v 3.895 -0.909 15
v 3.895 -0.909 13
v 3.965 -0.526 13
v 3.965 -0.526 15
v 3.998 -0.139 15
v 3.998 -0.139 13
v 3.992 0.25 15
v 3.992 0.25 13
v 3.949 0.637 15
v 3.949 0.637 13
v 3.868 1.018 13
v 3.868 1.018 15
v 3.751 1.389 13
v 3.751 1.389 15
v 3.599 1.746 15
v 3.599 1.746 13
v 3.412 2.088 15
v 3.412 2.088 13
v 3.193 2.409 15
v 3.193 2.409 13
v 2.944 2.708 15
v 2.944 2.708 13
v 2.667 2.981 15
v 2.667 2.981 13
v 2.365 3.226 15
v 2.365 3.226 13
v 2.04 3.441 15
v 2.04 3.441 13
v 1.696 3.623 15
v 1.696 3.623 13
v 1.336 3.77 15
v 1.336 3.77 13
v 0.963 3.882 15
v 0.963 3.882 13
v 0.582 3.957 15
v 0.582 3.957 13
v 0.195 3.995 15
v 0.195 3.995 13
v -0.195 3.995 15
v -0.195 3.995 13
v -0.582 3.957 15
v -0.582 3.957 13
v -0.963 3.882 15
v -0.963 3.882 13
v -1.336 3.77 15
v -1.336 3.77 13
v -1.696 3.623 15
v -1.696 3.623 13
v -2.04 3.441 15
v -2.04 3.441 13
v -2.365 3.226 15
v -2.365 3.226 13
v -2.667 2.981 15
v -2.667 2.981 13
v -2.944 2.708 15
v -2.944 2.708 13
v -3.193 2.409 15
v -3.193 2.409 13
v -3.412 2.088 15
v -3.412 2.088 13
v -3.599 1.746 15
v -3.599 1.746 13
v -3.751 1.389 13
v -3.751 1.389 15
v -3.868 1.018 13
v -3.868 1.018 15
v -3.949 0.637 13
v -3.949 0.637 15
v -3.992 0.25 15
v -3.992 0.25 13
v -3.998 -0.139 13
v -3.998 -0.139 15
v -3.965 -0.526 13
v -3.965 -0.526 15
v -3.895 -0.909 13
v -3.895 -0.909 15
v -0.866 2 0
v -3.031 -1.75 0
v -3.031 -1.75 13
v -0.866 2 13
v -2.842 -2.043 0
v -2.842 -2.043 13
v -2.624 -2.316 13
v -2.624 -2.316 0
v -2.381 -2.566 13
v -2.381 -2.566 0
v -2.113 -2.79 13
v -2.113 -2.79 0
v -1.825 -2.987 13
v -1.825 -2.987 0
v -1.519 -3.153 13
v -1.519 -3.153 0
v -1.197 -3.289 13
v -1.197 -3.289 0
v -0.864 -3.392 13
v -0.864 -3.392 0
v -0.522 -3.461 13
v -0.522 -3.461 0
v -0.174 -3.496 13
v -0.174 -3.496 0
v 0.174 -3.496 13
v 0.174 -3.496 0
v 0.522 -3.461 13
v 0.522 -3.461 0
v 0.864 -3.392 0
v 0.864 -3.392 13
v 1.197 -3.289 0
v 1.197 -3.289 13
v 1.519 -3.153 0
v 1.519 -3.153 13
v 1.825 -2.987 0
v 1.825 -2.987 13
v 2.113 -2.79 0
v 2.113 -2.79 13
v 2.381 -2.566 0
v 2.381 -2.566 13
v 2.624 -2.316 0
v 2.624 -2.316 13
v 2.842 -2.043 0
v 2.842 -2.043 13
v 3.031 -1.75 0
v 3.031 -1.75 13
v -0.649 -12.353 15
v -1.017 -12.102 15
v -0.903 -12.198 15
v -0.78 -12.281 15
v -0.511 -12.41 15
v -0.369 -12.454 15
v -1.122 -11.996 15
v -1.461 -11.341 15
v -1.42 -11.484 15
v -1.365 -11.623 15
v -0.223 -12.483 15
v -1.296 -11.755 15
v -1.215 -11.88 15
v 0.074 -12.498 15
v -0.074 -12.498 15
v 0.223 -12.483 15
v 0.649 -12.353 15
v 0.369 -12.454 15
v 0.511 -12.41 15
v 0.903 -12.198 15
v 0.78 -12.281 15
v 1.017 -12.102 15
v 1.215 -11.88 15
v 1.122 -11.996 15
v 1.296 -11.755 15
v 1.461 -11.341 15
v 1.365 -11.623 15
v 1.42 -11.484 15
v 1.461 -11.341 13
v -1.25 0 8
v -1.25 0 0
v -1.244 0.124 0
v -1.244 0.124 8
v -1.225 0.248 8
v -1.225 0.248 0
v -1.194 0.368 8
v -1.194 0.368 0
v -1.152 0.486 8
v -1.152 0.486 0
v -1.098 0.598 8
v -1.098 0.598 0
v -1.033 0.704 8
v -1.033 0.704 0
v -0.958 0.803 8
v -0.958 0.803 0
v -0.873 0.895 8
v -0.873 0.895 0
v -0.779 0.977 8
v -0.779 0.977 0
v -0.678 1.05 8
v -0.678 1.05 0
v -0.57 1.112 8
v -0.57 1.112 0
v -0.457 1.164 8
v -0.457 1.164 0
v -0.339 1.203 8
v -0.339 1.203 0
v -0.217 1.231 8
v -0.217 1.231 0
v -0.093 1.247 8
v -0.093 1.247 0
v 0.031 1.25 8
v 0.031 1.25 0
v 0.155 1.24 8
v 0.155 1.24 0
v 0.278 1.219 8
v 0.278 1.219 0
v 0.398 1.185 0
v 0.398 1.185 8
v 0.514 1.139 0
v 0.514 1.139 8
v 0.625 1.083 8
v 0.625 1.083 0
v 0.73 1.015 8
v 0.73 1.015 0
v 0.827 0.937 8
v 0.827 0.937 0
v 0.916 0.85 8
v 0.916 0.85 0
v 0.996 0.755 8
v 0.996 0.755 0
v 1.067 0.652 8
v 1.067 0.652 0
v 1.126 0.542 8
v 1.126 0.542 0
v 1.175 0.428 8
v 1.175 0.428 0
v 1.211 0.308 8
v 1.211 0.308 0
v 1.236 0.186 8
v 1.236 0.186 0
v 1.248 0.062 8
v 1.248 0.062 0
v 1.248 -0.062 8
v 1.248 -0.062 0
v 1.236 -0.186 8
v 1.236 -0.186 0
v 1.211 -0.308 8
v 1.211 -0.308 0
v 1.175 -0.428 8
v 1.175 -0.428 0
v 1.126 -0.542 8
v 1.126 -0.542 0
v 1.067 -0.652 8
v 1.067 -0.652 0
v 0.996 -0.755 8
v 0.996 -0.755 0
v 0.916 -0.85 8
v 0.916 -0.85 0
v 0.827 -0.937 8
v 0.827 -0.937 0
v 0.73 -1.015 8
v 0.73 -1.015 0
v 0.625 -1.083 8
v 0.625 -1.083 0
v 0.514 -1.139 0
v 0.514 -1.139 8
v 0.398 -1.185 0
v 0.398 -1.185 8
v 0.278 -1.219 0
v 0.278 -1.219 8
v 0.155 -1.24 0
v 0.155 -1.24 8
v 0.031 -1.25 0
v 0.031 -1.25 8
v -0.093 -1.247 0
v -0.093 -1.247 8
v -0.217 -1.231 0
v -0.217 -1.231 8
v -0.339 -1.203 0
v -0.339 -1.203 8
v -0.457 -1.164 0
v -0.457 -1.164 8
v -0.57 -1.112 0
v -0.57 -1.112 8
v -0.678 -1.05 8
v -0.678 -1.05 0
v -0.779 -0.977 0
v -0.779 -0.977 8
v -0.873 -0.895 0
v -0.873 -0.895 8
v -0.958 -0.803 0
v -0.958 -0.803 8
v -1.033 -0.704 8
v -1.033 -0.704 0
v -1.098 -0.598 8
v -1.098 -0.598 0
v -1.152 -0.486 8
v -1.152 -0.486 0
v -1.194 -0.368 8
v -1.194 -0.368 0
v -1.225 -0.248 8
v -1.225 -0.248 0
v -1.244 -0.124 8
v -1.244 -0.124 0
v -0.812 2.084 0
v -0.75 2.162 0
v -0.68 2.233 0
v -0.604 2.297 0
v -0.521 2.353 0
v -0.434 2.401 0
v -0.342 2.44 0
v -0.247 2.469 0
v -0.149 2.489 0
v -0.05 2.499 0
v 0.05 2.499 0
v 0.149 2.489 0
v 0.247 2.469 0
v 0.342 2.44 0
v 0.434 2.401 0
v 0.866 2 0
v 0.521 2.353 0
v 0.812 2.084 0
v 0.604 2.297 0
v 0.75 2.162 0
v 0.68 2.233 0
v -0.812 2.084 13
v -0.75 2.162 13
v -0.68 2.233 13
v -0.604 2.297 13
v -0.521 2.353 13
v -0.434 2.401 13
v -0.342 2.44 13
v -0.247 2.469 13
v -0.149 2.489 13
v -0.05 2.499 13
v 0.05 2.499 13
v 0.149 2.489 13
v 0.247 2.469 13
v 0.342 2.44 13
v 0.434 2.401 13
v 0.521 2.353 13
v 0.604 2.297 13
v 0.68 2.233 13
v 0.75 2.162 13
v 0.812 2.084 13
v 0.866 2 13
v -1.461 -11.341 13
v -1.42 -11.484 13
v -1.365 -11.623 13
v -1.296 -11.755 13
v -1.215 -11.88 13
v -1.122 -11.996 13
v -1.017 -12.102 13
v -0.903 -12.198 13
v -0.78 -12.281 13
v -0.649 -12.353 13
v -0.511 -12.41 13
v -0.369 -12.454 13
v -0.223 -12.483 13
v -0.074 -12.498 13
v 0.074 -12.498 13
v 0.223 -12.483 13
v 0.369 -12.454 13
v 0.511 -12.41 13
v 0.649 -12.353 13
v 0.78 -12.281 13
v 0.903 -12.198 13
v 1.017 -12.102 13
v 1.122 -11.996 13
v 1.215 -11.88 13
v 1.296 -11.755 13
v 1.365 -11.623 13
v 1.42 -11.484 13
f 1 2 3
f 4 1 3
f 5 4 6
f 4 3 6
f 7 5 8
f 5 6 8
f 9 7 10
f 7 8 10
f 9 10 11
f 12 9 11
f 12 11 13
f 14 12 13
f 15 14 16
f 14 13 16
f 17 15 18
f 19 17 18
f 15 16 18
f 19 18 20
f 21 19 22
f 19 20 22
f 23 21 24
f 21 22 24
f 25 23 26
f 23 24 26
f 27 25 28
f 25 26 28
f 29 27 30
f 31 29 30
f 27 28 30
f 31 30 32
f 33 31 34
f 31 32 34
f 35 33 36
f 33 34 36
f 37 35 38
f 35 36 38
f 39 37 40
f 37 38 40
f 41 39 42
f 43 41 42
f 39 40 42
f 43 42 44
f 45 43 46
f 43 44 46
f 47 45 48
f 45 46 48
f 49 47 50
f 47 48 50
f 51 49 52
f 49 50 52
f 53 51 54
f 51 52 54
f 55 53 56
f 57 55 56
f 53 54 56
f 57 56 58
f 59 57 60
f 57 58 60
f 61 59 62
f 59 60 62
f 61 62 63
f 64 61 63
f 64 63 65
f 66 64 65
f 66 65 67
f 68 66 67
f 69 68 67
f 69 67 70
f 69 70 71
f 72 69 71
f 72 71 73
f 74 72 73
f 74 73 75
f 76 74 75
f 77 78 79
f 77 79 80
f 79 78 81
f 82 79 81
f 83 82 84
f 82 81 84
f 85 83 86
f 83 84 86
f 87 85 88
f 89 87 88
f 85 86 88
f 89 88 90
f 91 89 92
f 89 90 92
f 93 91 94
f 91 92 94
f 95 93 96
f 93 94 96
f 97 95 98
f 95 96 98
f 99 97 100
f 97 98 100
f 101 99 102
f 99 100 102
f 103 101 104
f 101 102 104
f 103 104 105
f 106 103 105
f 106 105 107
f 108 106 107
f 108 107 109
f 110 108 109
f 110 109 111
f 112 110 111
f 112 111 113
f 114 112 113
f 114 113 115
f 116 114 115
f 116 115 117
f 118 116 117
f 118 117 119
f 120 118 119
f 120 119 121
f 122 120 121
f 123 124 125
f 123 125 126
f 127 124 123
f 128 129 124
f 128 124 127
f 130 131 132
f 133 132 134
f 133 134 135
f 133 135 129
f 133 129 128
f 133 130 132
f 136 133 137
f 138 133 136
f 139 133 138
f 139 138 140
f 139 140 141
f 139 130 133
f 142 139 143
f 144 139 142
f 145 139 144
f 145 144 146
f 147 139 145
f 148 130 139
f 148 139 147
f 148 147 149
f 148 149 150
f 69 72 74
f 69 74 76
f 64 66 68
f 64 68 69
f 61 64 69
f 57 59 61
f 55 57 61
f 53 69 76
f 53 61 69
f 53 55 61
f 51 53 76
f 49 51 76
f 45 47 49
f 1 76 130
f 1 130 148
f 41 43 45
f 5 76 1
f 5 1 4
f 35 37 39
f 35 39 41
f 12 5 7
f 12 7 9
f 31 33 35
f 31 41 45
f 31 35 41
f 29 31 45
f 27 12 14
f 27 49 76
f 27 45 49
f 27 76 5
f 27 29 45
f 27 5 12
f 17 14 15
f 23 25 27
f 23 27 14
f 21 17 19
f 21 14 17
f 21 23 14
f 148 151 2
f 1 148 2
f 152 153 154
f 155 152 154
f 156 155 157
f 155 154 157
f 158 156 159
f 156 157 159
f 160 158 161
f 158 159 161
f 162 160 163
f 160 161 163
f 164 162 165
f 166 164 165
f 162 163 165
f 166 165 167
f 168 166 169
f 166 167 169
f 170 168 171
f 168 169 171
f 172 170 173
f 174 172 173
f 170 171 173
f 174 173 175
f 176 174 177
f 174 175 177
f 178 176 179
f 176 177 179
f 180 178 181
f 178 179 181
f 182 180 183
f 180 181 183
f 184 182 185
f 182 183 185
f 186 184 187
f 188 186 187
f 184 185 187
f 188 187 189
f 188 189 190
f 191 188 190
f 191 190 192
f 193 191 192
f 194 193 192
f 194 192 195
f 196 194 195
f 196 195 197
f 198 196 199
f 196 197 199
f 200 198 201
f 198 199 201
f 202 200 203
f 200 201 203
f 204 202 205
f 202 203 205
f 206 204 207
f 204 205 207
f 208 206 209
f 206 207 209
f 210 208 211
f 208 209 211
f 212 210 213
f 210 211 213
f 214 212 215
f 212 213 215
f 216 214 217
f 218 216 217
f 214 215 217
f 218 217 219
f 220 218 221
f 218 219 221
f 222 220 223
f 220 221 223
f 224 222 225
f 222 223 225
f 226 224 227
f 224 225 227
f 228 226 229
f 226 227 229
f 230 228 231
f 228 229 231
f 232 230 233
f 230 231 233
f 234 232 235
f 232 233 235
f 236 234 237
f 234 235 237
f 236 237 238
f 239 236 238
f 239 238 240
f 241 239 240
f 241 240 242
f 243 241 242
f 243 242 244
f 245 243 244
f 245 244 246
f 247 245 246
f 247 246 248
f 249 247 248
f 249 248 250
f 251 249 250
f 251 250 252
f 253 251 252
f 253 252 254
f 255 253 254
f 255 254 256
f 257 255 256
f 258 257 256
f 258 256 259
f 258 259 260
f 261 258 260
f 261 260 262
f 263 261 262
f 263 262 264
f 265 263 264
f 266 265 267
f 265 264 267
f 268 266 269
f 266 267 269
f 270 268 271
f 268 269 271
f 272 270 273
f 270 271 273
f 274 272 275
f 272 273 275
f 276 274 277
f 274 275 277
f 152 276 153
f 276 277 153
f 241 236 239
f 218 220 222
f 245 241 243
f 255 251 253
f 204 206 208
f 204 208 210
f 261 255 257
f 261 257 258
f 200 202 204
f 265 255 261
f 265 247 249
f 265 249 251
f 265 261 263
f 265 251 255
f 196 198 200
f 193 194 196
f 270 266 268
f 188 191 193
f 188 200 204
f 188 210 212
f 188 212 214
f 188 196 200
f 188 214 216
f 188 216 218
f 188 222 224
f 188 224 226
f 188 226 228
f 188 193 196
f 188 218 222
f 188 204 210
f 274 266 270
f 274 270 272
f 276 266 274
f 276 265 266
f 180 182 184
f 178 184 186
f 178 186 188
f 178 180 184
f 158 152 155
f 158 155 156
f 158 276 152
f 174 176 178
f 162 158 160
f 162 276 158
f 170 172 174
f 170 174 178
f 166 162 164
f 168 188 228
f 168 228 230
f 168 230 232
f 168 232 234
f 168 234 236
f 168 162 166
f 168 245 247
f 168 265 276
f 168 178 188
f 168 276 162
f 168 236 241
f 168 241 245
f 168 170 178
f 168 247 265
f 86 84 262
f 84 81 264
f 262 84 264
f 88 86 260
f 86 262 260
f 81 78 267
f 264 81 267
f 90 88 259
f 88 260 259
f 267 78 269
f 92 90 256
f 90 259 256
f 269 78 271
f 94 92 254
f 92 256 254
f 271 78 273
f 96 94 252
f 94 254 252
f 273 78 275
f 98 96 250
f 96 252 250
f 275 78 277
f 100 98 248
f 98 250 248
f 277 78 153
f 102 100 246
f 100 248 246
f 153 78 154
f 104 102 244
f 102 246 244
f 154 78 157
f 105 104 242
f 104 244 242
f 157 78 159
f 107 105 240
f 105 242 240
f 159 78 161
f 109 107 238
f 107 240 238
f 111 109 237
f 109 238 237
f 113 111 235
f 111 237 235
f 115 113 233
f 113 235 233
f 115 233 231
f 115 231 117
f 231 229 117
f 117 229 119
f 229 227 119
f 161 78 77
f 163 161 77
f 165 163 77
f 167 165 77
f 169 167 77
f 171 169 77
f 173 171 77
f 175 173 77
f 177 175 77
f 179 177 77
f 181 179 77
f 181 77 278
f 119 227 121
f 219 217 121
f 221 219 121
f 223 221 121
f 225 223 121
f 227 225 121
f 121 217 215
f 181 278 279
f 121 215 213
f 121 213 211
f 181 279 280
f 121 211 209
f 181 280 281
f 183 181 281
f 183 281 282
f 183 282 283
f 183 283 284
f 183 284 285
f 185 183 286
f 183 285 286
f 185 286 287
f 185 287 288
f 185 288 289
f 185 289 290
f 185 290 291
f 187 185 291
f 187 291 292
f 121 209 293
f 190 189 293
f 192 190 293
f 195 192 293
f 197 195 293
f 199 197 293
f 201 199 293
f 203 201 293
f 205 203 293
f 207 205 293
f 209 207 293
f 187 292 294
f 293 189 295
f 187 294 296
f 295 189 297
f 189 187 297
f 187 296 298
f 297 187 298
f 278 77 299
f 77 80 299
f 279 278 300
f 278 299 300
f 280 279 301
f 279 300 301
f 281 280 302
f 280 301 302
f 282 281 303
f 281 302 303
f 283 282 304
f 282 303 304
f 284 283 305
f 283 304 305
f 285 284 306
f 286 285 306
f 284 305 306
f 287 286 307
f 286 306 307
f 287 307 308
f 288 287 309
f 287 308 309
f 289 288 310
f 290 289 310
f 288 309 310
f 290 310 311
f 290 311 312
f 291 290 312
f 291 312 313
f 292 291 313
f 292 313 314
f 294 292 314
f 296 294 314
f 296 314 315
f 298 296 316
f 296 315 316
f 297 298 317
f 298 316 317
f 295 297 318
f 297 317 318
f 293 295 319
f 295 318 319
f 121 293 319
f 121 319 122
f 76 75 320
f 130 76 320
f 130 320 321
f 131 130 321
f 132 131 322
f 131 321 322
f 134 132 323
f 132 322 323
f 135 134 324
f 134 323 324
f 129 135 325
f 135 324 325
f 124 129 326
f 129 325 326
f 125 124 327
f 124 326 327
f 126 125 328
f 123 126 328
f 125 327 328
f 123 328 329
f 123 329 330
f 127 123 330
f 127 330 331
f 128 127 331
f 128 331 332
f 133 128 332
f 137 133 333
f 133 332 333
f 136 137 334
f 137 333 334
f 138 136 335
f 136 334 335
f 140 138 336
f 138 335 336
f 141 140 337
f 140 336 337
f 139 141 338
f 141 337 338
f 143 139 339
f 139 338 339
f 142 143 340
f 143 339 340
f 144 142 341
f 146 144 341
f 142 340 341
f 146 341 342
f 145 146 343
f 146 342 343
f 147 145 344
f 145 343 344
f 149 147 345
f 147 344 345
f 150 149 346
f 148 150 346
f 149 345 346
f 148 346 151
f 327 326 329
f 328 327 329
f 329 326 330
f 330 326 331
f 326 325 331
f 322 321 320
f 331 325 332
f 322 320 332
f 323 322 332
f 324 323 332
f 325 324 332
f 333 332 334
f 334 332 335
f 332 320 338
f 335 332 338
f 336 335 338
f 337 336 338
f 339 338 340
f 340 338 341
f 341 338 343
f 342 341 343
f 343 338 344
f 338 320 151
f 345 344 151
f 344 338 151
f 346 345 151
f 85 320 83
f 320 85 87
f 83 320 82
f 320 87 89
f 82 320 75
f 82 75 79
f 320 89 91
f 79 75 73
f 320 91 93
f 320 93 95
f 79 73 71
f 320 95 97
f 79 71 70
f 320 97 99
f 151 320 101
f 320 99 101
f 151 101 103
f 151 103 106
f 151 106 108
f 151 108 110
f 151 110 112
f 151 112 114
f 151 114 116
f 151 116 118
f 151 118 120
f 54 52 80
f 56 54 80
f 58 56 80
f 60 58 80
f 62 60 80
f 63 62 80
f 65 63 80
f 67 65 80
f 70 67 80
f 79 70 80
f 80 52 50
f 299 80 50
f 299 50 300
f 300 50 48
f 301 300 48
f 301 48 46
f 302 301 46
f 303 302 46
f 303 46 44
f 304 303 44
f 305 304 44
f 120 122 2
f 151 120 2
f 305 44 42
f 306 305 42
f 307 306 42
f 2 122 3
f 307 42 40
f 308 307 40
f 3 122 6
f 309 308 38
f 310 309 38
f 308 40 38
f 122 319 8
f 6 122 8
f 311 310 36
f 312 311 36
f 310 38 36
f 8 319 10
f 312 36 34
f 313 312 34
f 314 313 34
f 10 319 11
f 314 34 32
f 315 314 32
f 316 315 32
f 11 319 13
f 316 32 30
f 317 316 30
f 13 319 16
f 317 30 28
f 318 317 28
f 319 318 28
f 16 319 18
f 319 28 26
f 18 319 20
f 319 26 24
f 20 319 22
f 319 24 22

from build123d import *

# Parameters (mm, degrees)
SKETCH_1_R          = 3.5
EXTRUDE_1_DEPTH     = 13
EXTRUDE_2_DEPTH     = 2
CUT_EXTRUDE_1_DEPTH = 13
SKETCH_4_R          = 1.25
CUT_EXTRUDE_2_DEPTH = 8
FILLET_1_R          = 1


with BuildPart() as part:
    # 草图1 → 凸台-拉伸1 (new body)
    with BuildSketch(Plane.XY):
        Circle(SKETCH_1_R)
    extrude(amount=EXTRUDE_1_DEPTH)

    # 草图2 → 凸台-拉伸2 (add)
    with BuildSketch(Plane.XY.offset(13)):
        with BuildLine():
            Line((-3.895324597, -0.909090909), (-1.460746724, -11.340909091))
            ThreePointArc((-1.460746724, -11.340909091), (0, -12.5), (1.460746724, -11.340909091))
            Line((1.460746724, -11.340909091), (3.895324597, -0.909090909))
            ThreePointArc((3.895324597, -0.909090909), (0, 4), (-3.895324597, -0.909090909))
        make_face()
    extrude(amount=EXTRUDE_2_DEPTH)

    # 草图3 → 切除-拉伸1 (cut)
    with BuildSketch(Plane(origin=(0, 0, 0), x_dir=(-1, 0, 0), z_dir=(0, 0, -1))):
        Polygon((0, 3.5), (-3.031088913, -1.75), (-6.759949263, -1.75), (0, 7.742275781), (6.759949263, -1.75), (3.031088913, -1.75), align=None)
    extrude(amount=-CUT_EXTRUDE_1_DEPTH, mode=Mode.SUBTRACT)

    # 草图4 → 切除-拉伸2 (cut)
    with BuildSketch(Plane(origin=(0, 0, 0), x_dir=(-1, 0, 0), z_dir=(0, 0, -1))):
        Circle(SKETCH_4_R)
    extrude(amount=-CUT_EXTRUDE_2_DEPTH, mode=Mode.SUBTRACT)

    # 圆角1
    fillet_1_edges = [part.edges().sort_by_distance(p)[0] for p in [
        (0, 3.5, 6.5),
    ]]
    fillet(fillet_1_edges, radius=FILLET_1_R)


solid = part.part
